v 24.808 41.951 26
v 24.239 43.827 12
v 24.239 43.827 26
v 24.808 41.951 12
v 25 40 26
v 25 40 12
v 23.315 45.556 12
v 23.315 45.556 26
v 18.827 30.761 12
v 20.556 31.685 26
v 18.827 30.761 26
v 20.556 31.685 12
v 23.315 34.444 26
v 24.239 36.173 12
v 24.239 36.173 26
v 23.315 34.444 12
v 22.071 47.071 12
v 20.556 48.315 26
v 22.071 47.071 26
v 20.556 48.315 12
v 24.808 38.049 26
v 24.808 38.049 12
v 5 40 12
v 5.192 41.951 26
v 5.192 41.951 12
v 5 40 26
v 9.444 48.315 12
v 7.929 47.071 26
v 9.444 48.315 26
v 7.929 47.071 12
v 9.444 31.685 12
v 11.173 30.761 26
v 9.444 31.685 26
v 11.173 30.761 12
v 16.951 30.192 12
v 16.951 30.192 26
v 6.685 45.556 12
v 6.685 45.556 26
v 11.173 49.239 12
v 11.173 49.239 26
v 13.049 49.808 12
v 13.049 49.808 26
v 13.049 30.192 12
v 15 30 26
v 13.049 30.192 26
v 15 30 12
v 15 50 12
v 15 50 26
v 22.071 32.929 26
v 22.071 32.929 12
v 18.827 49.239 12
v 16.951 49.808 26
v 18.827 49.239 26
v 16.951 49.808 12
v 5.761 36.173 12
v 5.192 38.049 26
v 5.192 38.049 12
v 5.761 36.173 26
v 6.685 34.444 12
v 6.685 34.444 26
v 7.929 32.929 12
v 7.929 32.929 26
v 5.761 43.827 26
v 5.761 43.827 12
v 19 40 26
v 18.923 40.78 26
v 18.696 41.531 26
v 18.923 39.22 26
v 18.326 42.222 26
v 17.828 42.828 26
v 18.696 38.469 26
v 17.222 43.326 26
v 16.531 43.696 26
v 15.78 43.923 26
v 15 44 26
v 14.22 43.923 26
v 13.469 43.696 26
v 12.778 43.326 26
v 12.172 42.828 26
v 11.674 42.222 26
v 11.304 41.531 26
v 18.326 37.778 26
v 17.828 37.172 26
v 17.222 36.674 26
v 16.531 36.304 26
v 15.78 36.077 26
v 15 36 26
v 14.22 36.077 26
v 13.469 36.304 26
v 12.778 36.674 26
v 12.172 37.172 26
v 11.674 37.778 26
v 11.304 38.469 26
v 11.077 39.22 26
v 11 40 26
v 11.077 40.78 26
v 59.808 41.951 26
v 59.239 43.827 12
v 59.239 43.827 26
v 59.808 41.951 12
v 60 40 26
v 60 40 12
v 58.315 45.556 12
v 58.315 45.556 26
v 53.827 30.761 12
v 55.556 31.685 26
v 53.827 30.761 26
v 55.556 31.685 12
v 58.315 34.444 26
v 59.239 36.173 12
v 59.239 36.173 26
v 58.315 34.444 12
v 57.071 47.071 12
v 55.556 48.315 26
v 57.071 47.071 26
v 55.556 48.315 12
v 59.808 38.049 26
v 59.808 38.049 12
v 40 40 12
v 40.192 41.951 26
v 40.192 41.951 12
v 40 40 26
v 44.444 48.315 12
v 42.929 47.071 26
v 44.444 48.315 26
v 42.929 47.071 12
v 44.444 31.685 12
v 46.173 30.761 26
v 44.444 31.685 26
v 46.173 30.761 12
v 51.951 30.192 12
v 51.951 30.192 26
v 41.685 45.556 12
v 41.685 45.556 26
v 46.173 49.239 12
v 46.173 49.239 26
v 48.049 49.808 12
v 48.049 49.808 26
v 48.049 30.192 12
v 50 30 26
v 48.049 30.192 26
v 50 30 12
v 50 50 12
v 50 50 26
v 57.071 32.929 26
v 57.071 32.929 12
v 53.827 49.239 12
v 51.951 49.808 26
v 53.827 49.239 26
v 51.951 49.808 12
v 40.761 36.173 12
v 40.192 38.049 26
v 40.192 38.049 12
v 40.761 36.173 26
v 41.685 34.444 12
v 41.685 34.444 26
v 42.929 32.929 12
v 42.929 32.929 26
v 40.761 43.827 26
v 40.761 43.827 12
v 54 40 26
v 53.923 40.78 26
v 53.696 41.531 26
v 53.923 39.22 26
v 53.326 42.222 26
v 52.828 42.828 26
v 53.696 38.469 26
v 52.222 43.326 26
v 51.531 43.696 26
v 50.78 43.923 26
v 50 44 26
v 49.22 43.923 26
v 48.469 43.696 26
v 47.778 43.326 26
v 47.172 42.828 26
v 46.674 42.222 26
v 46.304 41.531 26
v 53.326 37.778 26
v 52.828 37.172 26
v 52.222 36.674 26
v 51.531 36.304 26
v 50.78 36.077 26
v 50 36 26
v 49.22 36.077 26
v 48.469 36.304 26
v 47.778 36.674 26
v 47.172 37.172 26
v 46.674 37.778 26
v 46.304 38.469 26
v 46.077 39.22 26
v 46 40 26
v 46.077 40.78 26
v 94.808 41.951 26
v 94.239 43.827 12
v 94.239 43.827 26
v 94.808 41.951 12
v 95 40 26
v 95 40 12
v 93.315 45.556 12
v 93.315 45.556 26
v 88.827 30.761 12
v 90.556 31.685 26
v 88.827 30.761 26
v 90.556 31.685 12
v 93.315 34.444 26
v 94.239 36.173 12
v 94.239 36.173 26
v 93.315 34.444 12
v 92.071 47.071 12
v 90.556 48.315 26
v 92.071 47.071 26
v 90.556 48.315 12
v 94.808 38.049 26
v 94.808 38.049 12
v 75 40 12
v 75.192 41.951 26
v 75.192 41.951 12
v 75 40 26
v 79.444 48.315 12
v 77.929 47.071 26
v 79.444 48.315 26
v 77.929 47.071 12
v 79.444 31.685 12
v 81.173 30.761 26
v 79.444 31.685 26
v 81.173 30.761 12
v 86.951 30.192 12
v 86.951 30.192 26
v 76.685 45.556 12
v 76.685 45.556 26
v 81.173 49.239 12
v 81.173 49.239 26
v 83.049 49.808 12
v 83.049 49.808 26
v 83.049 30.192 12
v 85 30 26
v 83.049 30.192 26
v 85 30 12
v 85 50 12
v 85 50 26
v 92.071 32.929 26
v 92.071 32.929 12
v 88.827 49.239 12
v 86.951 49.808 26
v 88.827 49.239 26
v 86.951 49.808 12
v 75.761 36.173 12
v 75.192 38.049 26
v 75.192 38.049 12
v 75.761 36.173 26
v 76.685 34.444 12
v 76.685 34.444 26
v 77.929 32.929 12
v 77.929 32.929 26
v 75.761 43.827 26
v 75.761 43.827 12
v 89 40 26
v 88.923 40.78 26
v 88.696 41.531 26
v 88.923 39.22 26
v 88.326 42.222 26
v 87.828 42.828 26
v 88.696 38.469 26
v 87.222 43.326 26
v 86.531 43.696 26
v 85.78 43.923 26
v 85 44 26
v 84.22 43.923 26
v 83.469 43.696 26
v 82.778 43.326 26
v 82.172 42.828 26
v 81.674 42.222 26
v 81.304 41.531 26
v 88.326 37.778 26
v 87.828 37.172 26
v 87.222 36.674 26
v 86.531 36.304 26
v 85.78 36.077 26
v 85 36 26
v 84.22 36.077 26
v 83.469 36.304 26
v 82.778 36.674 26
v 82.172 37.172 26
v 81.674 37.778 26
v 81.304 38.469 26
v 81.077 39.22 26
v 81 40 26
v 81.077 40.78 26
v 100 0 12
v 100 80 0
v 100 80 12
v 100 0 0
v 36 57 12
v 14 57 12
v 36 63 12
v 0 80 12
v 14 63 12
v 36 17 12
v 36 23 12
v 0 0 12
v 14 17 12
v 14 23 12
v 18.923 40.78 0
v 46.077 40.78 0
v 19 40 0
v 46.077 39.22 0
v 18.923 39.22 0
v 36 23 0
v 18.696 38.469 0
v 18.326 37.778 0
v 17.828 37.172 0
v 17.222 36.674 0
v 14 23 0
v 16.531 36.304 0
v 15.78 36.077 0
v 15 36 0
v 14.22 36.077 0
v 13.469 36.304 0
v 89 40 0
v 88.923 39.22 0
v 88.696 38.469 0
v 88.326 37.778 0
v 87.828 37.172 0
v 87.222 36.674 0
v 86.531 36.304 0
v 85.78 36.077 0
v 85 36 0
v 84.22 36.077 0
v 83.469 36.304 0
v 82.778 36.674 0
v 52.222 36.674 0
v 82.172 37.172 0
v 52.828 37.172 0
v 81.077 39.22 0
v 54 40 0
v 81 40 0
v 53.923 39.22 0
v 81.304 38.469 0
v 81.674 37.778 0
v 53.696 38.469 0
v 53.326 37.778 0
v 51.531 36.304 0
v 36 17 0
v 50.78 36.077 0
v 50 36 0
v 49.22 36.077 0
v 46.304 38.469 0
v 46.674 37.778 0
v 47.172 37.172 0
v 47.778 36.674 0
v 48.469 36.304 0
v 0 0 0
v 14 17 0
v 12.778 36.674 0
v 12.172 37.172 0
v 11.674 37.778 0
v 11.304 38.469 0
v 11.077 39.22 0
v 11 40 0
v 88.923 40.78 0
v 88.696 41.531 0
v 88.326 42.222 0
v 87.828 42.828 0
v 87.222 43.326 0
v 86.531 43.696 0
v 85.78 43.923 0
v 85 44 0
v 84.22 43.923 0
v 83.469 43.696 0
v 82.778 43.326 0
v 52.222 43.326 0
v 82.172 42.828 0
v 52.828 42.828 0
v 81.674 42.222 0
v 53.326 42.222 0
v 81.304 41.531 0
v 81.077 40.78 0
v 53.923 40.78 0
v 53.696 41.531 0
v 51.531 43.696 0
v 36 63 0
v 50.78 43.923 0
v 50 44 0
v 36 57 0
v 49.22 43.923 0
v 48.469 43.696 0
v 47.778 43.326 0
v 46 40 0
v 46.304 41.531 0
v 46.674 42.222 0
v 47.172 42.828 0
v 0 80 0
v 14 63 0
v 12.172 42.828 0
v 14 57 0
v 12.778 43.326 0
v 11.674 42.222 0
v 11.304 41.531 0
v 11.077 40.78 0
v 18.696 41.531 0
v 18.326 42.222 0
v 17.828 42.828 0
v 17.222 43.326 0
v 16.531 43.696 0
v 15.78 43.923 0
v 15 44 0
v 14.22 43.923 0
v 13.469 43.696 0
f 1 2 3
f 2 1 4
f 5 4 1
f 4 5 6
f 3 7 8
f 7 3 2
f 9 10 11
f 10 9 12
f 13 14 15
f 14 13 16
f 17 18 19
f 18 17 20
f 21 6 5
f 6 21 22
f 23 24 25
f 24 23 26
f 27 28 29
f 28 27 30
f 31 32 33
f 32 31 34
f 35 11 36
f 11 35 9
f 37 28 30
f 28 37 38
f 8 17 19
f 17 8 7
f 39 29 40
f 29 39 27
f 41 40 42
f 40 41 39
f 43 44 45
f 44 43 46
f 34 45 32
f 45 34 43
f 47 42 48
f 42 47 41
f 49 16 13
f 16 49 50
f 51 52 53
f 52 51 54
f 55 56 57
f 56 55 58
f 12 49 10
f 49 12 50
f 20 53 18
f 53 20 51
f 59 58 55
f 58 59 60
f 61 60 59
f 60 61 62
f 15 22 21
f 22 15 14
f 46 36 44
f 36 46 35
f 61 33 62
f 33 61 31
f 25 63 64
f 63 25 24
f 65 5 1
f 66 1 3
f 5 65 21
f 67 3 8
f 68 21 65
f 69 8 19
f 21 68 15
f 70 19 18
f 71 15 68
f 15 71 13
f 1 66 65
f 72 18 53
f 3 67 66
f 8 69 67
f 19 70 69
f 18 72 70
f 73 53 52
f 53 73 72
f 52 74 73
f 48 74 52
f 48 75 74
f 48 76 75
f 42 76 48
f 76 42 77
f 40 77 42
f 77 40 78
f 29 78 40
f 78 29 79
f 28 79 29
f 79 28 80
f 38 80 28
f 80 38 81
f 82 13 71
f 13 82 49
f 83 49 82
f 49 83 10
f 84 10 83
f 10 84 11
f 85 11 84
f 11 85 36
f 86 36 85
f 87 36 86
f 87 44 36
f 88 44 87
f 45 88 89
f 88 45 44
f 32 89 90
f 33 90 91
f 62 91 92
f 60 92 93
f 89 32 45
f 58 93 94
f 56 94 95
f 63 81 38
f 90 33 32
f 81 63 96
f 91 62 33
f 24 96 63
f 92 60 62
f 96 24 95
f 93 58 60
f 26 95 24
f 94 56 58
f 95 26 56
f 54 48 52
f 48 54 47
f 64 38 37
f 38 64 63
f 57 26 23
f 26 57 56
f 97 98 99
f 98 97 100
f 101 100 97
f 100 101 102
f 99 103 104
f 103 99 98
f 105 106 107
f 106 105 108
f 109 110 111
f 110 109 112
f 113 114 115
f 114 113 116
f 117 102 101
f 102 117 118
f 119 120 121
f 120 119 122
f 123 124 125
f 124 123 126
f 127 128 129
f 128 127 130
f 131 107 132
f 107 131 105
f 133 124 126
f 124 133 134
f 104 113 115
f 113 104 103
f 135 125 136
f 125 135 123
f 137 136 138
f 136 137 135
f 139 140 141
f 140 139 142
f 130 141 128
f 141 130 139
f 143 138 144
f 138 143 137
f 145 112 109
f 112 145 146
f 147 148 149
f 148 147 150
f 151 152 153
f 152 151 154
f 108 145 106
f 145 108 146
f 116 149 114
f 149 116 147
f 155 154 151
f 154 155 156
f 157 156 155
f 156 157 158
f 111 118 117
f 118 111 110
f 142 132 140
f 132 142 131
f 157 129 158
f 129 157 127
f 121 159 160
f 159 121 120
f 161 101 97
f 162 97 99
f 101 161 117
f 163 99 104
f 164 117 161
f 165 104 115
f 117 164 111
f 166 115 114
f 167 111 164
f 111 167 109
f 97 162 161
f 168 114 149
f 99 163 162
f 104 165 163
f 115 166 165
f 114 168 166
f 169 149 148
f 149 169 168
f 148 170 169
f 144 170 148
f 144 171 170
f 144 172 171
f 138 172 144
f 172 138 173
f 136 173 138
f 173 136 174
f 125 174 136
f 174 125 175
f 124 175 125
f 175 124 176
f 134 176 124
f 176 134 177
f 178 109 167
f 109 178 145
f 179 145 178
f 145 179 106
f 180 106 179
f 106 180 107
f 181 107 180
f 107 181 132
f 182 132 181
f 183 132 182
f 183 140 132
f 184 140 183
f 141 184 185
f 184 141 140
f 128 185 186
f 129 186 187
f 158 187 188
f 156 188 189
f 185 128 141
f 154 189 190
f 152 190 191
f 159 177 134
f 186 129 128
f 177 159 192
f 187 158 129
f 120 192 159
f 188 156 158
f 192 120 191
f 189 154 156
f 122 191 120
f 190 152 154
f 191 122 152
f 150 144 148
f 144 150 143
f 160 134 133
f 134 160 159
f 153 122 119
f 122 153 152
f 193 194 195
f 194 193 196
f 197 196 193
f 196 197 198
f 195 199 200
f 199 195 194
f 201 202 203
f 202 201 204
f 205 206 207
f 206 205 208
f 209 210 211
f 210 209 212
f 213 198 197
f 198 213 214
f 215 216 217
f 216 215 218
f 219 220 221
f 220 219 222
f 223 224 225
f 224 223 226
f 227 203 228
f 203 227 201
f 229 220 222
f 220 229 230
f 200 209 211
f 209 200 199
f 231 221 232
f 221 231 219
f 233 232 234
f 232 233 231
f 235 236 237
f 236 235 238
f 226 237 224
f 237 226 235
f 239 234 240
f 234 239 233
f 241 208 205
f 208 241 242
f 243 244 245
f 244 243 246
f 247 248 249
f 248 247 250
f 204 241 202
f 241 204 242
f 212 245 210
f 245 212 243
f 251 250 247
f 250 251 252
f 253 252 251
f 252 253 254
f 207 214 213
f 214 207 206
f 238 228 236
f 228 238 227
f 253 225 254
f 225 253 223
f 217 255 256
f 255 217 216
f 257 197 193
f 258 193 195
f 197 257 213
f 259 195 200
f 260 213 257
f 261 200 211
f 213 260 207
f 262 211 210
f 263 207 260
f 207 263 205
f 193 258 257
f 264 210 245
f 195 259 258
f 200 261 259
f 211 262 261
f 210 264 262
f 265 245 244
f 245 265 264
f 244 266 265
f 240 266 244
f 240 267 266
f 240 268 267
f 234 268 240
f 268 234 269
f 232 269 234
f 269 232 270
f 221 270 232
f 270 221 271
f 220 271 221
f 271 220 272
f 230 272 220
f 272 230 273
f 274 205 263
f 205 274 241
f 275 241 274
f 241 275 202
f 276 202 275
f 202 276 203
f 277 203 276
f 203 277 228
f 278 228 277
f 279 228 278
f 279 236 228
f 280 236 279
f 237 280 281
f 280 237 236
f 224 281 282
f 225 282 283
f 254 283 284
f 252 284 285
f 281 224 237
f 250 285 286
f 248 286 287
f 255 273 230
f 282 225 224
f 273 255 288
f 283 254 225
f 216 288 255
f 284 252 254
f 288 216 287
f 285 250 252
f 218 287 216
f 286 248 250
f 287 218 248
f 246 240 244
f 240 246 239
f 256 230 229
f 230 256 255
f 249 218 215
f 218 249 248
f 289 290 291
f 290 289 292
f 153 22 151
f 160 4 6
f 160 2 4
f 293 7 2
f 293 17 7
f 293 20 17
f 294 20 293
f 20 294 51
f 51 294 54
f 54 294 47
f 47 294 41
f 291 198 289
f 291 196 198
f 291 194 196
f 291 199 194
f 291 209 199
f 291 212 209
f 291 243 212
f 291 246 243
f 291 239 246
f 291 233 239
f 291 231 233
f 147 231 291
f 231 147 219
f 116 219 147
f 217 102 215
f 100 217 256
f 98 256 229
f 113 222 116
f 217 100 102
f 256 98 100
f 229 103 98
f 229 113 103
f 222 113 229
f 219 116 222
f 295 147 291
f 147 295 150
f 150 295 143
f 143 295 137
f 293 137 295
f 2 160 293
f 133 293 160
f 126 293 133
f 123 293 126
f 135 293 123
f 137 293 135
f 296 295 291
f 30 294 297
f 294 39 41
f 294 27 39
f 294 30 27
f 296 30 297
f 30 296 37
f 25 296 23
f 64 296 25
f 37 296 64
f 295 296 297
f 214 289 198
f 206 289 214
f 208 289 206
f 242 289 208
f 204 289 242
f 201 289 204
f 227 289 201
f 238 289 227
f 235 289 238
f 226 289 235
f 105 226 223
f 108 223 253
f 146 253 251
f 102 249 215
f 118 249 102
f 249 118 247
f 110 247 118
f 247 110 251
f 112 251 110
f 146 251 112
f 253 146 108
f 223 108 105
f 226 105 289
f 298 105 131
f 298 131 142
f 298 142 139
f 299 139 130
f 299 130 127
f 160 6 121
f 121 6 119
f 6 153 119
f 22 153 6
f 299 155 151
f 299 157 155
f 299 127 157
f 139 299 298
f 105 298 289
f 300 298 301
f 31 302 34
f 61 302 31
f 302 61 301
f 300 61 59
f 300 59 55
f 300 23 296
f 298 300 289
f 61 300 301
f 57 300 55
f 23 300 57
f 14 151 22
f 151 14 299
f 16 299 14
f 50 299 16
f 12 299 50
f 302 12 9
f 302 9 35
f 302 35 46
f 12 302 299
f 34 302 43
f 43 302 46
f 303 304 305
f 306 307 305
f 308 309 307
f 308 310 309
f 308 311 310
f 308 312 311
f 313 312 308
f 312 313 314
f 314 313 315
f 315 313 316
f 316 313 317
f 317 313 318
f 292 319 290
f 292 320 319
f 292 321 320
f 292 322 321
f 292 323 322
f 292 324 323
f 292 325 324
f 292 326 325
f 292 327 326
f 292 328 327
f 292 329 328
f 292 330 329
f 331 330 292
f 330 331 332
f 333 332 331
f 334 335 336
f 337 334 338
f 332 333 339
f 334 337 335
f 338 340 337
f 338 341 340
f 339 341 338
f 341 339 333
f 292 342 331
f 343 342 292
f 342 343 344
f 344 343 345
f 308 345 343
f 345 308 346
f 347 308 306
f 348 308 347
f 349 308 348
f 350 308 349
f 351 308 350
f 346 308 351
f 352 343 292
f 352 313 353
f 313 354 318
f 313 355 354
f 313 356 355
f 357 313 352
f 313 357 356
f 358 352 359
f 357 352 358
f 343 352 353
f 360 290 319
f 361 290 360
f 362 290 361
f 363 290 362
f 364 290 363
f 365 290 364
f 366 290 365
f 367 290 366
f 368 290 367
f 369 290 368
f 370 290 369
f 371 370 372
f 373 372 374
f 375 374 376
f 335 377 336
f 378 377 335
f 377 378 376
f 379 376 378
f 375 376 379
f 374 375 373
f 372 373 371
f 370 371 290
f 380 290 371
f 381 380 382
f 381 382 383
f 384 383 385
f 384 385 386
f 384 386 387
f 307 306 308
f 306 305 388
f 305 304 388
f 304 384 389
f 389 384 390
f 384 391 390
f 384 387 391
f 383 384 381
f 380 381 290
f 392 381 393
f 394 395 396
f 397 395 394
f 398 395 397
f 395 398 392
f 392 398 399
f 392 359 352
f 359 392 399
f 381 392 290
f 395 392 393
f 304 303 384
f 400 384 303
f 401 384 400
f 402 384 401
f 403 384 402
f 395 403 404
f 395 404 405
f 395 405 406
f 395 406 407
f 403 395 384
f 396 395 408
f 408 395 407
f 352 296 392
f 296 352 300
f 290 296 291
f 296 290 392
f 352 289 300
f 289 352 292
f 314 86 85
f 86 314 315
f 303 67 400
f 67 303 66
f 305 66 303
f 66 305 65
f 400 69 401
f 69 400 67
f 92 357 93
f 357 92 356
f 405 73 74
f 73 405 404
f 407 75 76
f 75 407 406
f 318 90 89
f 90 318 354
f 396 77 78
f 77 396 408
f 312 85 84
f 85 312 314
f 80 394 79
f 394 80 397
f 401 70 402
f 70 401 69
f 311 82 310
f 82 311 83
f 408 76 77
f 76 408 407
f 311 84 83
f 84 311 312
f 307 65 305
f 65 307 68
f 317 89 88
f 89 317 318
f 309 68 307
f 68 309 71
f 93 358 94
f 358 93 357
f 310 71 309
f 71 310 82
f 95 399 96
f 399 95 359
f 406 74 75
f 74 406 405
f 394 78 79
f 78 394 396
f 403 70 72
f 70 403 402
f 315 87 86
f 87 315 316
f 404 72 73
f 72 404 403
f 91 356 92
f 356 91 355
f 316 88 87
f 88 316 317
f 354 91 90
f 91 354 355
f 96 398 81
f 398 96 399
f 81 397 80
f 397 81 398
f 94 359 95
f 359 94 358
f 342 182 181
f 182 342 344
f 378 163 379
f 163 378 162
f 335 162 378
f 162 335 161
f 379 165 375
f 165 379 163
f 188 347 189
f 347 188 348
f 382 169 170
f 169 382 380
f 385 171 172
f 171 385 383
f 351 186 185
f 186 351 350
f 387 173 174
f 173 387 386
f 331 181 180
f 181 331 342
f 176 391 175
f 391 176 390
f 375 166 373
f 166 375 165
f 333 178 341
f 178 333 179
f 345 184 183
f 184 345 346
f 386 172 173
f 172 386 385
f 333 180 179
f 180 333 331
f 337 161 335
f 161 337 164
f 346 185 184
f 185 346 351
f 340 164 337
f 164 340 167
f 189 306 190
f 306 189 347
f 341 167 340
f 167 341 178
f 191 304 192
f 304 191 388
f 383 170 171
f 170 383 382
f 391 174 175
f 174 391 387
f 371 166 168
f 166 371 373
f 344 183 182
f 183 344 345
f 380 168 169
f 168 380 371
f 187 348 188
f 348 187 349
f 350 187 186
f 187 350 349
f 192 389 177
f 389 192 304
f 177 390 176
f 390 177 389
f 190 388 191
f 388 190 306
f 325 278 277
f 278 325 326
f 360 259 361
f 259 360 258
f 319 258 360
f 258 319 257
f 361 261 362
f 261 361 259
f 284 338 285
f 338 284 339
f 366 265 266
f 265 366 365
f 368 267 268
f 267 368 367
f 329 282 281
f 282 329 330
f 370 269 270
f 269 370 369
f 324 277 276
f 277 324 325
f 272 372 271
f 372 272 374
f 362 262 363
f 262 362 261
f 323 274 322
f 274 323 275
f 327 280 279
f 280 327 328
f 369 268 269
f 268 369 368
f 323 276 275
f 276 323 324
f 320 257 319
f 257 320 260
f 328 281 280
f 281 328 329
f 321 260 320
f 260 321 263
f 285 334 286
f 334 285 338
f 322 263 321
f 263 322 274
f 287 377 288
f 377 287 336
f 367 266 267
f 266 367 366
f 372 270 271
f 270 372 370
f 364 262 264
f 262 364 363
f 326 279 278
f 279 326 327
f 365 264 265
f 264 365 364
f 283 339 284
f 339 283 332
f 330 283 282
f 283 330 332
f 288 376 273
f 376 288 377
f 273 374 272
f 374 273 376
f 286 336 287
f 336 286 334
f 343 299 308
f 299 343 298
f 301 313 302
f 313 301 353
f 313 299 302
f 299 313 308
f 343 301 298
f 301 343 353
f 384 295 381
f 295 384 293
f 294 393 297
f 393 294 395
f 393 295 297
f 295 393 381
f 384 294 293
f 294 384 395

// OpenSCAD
$fn = 32;

// ----------------------------------------------------------------------
// Drill jig: three_boss_slot jig
// ----------------------------------------------------------------------

// --- parameters (mm) ---
plate_l = 100;            // plate length, X
plate_w = 80;             // plate width, Y
plate_t = 12;             // plate thickness
boss_d = 20;              // guide boss diameter
boss_h = 15;              // boss height above the plate
guide_d = 8;              // guide hole diameter
boss_pitch = 35;          // boss pitch
slot_w = 6;               // clamp slot width
slot_l = 22;              // clamp slot length
slot_x = 14;              // slot start X

n_boss = 3;  // guide bosses
boss_x0 = (plate_l - (n_boss - 1) * boss_pitch) / 2;  // first boss X
boss_top = plate_t - 1 + boss_h;  // boss crown height
total_h = boss_top;  // overall height

difference() {
  union() {
  cube([plate_l, plate_w, plate_t]);
  for (i = [0 : n_boss - 1])
    translate([boss_x0 + i * boss_pitch, plate_w / 2, plate_t - 1])
      cylinder(h = boss_h, d = boss_d);
  }
  for (i = [0 : n_boss - 1])
    translate([boss_x0 + i * boss_pitch, plate_w / 2, -1])
      cylinder(h = plate_t + boss_h, d = guide_d);
  for (cy = [plate_w * 0.25, plate_w * 0.75])
    translate([slot_x, cy - slot_w / 2, -1])
      cube([slot_l, slot_w, plate_t + 2]);
}
